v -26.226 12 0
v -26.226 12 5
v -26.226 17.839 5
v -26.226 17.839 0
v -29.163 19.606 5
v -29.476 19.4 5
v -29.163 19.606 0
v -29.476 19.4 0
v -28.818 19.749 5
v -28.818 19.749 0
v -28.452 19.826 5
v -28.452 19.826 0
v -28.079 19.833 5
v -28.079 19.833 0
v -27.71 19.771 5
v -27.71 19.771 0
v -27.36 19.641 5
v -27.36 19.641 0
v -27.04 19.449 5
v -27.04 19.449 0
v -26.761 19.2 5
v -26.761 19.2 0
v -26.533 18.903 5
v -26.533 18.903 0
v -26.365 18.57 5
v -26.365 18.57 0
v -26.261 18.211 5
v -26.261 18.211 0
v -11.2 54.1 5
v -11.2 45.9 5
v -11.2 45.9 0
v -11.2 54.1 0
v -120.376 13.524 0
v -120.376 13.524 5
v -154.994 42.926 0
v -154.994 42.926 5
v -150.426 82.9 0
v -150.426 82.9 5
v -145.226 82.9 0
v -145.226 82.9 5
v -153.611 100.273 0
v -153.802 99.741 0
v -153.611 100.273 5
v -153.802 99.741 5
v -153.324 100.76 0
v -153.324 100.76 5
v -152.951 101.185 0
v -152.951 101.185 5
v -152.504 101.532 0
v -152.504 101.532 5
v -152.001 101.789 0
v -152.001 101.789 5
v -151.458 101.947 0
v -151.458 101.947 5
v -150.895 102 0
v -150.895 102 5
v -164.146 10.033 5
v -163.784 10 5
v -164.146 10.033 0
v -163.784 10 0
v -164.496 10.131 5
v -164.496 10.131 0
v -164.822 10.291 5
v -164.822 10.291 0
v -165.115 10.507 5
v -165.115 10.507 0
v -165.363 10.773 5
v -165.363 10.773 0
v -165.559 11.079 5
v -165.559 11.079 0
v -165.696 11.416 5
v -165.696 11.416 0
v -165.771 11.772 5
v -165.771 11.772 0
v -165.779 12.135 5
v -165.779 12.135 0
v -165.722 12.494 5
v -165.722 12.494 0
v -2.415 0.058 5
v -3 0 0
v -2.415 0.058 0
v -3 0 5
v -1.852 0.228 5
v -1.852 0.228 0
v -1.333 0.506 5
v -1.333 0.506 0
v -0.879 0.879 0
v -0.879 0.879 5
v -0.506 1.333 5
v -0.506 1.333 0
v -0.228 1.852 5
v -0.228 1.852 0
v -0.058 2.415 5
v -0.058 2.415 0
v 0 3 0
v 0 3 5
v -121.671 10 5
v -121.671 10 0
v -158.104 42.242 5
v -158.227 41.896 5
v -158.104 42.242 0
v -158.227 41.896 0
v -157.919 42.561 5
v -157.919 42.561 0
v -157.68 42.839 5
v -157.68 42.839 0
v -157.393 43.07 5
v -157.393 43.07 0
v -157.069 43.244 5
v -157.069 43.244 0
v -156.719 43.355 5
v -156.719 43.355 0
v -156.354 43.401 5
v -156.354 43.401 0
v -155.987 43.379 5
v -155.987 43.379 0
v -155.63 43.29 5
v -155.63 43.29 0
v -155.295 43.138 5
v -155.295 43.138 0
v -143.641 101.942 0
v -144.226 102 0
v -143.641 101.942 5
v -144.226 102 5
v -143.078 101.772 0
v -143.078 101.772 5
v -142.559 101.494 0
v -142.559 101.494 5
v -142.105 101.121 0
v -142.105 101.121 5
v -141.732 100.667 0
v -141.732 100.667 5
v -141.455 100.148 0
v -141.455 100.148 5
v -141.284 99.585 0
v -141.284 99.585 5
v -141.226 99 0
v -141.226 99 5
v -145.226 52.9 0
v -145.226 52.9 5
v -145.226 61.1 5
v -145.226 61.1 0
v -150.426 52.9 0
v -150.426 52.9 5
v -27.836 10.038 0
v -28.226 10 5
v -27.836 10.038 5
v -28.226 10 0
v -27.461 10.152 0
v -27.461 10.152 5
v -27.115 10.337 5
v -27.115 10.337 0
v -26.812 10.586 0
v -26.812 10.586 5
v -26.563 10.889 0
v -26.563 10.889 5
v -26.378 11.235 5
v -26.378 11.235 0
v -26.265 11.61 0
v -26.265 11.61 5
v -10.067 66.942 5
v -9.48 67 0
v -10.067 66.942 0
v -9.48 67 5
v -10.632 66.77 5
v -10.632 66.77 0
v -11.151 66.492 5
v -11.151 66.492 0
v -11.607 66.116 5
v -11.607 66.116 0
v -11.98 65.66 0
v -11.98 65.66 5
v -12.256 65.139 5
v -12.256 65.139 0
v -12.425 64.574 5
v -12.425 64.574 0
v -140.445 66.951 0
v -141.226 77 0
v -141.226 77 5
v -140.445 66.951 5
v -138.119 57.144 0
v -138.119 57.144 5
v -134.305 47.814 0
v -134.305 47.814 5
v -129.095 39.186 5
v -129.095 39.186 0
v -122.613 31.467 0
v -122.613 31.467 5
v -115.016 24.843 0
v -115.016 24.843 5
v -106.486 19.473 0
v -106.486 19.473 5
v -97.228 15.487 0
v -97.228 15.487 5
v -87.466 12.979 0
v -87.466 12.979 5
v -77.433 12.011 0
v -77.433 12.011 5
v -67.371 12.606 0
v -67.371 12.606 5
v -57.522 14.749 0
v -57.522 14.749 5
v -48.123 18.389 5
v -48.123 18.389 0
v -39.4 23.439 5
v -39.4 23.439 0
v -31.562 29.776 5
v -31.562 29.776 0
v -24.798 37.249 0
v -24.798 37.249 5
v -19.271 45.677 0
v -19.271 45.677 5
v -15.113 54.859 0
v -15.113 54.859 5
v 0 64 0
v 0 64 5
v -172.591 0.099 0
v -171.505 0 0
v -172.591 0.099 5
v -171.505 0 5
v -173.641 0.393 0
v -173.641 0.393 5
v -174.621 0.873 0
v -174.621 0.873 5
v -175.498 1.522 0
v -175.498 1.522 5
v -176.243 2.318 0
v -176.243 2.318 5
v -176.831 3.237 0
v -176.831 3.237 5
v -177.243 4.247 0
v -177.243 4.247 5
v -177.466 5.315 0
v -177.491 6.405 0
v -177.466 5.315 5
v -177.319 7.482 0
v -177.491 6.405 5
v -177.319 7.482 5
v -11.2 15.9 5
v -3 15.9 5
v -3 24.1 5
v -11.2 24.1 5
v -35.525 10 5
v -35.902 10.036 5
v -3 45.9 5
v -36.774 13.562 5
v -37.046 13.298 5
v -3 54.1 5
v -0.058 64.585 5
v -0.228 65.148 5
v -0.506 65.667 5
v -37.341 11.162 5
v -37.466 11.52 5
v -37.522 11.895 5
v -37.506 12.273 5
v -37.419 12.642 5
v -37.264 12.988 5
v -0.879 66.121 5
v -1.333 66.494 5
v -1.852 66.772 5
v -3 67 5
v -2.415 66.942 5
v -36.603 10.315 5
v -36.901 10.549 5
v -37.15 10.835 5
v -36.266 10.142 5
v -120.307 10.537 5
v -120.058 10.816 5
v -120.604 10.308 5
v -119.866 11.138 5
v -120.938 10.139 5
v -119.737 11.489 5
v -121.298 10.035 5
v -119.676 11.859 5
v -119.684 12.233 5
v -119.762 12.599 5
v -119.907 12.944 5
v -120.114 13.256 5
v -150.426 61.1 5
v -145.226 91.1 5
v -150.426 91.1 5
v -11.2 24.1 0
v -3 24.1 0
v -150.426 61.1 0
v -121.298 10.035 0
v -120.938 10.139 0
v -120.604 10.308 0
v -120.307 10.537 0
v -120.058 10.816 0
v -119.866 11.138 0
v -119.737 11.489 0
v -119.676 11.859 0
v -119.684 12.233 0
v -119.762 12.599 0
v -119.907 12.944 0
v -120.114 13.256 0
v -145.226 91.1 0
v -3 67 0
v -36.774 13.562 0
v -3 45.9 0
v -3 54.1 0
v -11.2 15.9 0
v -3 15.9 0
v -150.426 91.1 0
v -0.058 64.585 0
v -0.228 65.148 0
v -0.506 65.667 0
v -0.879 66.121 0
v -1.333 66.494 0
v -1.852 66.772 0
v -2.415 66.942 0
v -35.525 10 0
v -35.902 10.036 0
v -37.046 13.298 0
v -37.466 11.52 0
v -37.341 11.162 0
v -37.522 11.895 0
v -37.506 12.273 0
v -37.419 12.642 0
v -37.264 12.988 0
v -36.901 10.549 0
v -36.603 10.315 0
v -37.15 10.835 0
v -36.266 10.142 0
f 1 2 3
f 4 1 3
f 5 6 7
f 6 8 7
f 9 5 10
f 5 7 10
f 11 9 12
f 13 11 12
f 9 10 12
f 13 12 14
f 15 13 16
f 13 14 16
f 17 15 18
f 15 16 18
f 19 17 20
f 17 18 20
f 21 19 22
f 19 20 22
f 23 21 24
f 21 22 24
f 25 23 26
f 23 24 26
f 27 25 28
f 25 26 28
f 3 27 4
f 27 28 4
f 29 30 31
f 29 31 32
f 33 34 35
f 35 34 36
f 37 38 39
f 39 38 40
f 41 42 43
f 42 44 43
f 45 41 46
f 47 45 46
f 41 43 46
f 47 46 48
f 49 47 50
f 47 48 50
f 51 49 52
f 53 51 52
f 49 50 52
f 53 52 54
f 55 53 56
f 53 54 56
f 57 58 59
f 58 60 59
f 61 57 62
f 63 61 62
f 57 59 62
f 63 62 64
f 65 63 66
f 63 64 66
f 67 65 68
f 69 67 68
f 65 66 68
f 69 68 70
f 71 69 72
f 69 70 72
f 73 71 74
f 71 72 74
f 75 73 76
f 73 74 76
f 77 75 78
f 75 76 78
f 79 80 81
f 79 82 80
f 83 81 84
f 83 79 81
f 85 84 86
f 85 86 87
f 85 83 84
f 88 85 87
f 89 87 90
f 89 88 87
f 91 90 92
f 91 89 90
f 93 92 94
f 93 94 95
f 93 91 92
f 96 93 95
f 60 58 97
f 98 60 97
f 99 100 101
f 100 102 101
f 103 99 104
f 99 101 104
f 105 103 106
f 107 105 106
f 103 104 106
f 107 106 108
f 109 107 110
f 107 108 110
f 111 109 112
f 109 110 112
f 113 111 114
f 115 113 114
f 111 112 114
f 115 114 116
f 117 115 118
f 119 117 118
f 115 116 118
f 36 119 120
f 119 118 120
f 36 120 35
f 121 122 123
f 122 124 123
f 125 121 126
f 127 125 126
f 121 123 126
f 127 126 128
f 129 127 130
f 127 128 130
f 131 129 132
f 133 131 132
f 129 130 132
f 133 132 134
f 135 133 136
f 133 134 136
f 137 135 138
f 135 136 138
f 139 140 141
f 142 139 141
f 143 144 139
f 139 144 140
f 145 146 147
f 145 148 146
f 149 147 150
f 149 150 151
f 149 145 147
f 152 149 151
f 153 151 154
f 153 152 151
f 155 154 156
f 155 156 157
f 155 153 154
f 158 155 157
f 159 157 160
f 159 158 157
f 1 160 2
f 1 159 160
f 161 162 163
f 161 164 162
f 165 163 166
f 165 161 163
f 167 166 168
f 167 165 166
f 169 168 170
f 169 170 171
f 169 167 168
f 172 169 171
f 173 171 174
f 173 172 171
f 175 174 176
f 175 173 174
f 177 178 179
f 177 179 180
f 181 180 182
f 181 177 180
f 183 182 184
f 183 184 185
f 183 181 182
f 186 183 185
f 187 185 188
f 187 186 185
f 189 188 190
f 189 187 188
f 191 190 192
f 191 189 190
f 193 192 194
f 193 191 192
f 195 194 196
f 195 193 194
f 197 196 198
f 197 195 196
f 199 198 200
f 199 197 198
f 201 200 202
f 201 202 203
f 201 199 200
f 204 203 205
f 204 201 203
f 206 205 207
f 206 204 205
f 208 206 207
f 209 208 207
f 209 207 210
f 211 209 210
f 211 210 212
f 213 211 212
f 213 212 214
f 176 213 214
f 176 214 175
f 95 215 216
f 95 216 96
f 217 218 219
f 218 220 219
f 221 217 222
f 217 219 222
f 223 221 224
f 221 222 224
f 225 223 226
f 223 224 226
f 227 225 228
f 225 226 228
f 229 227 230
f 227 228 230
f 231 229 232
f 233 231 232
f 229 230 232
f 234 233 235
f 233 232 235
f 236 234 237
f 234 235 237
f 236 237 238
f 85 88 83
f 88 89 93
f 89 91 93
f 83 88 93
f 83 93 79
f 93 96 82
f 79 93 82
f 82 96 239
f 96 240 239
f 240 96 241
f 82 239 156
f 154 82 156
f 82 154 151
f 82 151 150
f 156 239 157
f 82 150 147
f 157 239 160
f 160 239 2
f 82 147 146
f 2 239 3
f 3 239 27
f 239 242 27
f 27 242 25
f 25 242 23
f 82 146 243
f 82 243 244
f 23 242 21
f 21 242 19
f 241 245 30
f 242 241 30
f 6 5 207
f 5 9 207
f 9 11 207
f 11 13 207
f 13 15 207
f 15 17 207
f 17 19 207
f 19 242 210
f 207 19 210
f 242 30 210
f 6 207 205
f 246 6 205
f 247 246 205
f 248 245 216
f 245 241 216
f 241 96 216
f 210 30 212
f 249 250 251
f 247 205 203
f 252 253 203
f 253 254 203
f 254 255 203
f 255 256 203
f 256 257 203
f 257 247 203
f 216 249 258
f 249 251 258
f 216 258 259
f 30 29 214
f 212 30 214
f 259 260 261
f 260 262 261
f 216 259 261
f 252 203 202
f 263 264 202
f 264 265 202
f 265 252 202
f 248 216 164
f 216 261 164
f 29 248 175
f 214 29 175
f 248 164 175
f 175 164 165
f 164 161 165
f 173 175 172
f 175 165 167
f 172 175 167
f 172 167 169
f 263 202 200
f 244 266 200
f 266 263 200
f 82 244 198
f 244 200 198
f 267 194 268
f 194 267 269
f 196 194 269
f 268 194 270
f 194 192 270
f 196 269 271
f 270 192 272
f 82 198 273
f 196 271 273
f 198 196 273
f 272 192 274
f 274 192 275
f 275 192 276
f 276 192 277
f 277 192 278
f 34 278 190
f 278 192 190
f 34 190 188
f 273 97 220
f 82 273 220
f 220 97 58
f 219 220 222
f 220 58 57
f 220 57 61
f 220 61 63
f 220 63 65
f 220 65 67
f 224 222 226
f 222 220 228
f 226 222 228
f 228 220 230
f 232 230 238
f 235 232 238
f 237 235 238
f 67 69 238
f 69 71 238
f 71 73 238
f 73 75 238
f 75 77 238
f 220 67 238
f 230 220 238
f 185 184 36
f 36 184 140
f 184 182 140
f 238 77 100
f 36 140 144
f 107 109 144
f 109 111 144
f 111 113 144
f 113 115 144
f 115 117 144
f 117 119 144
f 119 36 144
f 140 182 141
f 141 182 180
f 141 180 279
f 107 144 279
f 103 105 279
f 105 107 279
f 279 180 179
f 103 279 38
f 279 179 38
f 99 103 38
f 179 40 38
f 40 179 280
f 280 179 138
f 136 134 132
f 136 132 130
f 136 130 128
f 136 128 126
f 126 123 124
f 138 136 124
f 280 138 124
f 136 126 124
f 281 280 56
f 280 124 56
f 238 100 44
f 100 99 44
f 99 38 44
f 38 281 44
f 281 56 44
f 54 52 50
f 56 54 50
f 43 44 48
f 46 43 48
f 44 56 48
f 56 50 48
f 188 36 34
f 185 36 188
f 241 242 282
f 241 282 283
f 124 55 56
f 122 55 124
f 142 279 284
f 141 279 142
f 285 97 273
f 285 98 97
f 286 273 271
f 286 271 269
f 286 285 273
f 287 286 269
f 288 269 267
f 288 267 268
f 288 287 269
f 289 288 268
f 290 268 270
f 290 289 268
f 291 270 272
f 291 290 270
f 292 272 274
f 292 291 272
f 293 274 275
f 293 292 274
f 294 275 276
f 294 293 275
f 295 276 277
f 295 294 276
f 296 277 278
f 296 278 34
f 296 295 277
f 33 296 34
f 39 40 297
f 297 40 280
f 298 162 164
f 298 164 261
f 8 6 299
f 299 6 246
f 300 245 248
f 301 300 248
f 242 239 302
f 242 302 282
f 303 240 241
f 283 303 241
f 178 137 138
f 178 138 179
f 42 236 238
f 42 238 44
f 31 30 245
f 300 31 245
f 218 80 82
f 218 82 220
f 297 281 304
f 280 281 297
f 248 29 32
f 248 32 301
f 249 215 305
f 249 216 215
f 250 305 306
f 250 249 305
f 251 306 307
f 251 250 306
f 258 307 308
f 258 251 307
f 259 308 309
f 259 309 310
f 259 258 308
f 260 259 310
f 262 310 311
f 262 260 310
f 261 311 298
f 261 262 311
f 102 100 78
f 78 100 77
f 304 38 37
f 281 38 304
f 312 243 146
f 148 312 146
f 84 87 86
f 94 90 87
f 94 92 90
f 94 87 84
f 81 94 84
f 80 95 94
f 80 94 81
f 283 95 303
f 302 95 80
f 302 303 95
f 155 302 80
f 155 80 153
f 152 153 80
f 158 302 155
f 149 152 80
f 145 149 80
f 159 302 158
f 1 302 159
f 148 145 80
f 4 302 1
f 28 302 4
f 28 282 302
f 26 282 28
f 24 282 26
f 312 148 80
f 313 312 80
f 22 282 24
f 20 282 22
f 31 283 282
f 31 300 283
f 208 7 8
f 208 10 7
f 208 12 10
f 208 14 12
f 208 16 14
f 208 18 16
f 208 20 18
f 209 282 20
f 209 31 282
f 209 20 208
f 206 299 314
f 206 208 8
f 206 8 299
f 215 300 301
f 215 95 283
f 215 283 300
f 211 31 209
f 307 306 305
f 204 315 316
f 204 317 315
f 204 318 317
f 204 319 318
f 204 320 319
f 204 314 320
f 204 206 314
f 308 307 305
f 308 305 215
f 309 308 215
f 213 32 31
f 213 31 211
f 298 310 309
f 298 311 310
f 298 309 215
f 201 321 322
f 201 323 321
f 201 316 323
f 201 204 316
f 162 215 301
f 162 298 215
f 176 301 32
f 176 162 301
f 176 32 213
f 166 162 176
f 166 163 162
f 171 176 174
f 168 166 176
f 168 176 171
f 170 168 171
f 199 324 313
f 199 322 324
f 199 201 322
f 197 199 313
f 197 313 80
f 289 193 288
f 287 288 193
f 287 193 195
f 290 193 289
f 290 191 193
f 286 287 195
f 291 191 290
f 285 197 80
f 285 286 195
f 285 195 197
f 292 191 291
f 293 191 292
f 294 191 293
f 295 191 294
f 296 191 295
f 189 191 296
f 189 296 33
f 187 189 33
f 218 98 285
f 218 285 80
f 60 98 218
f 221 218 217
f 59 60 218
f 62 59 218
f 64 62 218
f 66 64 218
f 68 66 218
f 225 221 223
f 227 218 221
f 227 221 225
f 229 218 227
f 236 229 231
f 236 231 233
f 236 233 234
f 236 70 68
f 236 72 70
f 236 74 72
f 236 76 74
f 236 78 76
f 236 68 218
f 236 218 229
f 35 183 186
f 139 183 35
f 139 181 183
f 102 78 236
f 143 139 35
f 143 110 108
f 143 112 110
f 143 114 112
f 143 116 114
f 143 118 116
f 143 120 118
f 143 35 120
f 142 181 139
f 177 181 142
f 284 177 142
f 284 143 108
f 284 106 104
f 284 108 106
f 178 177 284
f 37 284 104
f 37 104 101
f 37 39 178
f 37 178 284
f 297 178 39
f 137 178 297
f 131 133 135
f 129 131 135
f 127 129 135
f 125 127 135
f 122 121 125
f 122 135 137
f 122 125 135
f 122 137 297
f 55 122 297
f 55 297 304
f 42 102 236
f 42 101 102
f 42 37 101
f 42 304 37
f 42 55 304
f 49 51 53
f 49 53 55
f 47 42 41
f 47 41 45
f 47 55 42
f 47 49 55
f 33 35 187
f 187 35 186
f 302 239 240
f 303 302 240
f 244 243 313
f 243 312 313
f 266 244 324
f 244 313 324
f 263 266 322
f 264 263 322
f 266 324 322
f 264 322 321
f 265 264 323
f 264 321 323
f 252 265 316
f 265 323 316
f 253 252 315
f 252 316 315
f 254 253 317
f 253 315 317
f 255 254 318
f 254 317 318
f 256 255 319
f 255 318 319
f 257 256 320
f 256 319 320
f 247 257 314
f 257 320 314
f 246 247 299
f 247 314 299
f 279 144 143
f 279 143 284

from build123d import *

# Parameters (mm, degrees)
SALIENTE_EXTRUIR1_DEPTH = 5
CORTAR_EXTRUIR3_DEPTH   = 10
REDONDEO4_R             = 2
CROQUIS3_W              = 5.2
CROQUIS3_H              = 8.2
CORTAR_EXTRUIR2_DEPTH   = 10
REDONDEO2_R             = 3
REDONDEO3_R             = 6
CROQUIS5_W              = 8.2
CROQUIS5_H              = 8.2
CORTAR_EXTRUIR4_DEPTH   = 10


with BuildPart() as part:
    # Croquis1 → Saliente-Extruir1 (new body)
    with BuildSketch(Plane.XY):
        with BuildLine():
            Line((0, 0), (-179.226162893, 0))
            Line((-179.226162893, 0), (-153.226162893, 102))
            Line((-153.226162893, 102), (-141.226162893, 102))
            Line((-141.226162893, 102), (-141.226162893, 77))
            ThreePointArc((-141.226162893, 77), (-81.241111145, 12.193748033), (-12, 67))
            Line((-12, 67), (0, 67))
            Line((0, 67), (0, 0))
        make_face()
    extrude(amount=SALIENTE_EXTRUIR1_DEPTH)

    # Croquis4 → Cortar-Extruir3 (cut)
    with BuildSketch(Plane.XY.offset(5)):
        Polygon((-166.357380645, 10), (-116.226162893, 10), (-157.435812017, 45), align=None)
        Polygon((-41.226162893, 10), (-26.226162893, 10), (-26.226162893, 22), align=None)
    extrude(amount=-CORTAR_EXTRUIR3_DEPTH, mode=Mode.SUBTRACT)

    # Redondeo4
    redondeo4_edges = [part.edges().sort_by_distance(p)[0] for p in [
        (-166.357380645, 10, 2.5),
        (-157.435812017, 45, 2.5),
        (-116.226162893, 10, 2.5),
        (-41.226162893, 10, 2.5),
        (-26.226162893, 22, 2.5),
        (-26.226162893, 10, 2.5),
    ]]
    fillet(redondeo4_edges, radius=REDONDEO4_R)

    # Croquis3 → Cortar-Extruir2 (cut)
    with BuildSketch(Plane.XY.offset(5)):
        with Locations((-147.826162893, 87)):
            Rectangle(CROQUIS3_W, CROQUIS3_H)
        with Locations((-147.826162893, 57)):
            Rectangle(CROQUIS3_W, CROQUIS3_H)
    extrude(amount=-CORTAR_EXTRUIR2_DEPTH, mode=Mode.SUBTRACT)

    # Redondeo2
    redondeo2_edges = [part.edges().sort_by_distance(p)[0] for p in [
        (0, 0, 2.5),
        (-153.226162893, 102, 2.5),
        (-141.226162893, 102, 2.5),
        (-12, 67, 2.5),
        (0, 67, 2.5),
    ]]
    fillet(redondeo2_edges, radius=REDONDEO2_R)

    # Redondeo3
    redondeo3_edges = [part.edges().sort_by_distance(p)[0] for p in [
        (-179.226162893, 0, 2.5),
    ]]
    fillet(redondeo3_edges, radius=REDONDEO3_R)

    # Croquis5 → Cortar-Extruir4 (cut)
    with BuildSketch(Plane.XY.offset(5)):
        with Locations((-7.1, 50)):
            Rectangle(CROQUIS5_W, CROQUIS5_H)
        with Locations((-7.1, 20)):
            Rectangle(CROQUIS5_W, CROQUIS5_H)
    extrude(amount=-CORTAR_EXTRUIR4_DEPTH, mode=Mode.SUBTRACT)


solid = part.part
